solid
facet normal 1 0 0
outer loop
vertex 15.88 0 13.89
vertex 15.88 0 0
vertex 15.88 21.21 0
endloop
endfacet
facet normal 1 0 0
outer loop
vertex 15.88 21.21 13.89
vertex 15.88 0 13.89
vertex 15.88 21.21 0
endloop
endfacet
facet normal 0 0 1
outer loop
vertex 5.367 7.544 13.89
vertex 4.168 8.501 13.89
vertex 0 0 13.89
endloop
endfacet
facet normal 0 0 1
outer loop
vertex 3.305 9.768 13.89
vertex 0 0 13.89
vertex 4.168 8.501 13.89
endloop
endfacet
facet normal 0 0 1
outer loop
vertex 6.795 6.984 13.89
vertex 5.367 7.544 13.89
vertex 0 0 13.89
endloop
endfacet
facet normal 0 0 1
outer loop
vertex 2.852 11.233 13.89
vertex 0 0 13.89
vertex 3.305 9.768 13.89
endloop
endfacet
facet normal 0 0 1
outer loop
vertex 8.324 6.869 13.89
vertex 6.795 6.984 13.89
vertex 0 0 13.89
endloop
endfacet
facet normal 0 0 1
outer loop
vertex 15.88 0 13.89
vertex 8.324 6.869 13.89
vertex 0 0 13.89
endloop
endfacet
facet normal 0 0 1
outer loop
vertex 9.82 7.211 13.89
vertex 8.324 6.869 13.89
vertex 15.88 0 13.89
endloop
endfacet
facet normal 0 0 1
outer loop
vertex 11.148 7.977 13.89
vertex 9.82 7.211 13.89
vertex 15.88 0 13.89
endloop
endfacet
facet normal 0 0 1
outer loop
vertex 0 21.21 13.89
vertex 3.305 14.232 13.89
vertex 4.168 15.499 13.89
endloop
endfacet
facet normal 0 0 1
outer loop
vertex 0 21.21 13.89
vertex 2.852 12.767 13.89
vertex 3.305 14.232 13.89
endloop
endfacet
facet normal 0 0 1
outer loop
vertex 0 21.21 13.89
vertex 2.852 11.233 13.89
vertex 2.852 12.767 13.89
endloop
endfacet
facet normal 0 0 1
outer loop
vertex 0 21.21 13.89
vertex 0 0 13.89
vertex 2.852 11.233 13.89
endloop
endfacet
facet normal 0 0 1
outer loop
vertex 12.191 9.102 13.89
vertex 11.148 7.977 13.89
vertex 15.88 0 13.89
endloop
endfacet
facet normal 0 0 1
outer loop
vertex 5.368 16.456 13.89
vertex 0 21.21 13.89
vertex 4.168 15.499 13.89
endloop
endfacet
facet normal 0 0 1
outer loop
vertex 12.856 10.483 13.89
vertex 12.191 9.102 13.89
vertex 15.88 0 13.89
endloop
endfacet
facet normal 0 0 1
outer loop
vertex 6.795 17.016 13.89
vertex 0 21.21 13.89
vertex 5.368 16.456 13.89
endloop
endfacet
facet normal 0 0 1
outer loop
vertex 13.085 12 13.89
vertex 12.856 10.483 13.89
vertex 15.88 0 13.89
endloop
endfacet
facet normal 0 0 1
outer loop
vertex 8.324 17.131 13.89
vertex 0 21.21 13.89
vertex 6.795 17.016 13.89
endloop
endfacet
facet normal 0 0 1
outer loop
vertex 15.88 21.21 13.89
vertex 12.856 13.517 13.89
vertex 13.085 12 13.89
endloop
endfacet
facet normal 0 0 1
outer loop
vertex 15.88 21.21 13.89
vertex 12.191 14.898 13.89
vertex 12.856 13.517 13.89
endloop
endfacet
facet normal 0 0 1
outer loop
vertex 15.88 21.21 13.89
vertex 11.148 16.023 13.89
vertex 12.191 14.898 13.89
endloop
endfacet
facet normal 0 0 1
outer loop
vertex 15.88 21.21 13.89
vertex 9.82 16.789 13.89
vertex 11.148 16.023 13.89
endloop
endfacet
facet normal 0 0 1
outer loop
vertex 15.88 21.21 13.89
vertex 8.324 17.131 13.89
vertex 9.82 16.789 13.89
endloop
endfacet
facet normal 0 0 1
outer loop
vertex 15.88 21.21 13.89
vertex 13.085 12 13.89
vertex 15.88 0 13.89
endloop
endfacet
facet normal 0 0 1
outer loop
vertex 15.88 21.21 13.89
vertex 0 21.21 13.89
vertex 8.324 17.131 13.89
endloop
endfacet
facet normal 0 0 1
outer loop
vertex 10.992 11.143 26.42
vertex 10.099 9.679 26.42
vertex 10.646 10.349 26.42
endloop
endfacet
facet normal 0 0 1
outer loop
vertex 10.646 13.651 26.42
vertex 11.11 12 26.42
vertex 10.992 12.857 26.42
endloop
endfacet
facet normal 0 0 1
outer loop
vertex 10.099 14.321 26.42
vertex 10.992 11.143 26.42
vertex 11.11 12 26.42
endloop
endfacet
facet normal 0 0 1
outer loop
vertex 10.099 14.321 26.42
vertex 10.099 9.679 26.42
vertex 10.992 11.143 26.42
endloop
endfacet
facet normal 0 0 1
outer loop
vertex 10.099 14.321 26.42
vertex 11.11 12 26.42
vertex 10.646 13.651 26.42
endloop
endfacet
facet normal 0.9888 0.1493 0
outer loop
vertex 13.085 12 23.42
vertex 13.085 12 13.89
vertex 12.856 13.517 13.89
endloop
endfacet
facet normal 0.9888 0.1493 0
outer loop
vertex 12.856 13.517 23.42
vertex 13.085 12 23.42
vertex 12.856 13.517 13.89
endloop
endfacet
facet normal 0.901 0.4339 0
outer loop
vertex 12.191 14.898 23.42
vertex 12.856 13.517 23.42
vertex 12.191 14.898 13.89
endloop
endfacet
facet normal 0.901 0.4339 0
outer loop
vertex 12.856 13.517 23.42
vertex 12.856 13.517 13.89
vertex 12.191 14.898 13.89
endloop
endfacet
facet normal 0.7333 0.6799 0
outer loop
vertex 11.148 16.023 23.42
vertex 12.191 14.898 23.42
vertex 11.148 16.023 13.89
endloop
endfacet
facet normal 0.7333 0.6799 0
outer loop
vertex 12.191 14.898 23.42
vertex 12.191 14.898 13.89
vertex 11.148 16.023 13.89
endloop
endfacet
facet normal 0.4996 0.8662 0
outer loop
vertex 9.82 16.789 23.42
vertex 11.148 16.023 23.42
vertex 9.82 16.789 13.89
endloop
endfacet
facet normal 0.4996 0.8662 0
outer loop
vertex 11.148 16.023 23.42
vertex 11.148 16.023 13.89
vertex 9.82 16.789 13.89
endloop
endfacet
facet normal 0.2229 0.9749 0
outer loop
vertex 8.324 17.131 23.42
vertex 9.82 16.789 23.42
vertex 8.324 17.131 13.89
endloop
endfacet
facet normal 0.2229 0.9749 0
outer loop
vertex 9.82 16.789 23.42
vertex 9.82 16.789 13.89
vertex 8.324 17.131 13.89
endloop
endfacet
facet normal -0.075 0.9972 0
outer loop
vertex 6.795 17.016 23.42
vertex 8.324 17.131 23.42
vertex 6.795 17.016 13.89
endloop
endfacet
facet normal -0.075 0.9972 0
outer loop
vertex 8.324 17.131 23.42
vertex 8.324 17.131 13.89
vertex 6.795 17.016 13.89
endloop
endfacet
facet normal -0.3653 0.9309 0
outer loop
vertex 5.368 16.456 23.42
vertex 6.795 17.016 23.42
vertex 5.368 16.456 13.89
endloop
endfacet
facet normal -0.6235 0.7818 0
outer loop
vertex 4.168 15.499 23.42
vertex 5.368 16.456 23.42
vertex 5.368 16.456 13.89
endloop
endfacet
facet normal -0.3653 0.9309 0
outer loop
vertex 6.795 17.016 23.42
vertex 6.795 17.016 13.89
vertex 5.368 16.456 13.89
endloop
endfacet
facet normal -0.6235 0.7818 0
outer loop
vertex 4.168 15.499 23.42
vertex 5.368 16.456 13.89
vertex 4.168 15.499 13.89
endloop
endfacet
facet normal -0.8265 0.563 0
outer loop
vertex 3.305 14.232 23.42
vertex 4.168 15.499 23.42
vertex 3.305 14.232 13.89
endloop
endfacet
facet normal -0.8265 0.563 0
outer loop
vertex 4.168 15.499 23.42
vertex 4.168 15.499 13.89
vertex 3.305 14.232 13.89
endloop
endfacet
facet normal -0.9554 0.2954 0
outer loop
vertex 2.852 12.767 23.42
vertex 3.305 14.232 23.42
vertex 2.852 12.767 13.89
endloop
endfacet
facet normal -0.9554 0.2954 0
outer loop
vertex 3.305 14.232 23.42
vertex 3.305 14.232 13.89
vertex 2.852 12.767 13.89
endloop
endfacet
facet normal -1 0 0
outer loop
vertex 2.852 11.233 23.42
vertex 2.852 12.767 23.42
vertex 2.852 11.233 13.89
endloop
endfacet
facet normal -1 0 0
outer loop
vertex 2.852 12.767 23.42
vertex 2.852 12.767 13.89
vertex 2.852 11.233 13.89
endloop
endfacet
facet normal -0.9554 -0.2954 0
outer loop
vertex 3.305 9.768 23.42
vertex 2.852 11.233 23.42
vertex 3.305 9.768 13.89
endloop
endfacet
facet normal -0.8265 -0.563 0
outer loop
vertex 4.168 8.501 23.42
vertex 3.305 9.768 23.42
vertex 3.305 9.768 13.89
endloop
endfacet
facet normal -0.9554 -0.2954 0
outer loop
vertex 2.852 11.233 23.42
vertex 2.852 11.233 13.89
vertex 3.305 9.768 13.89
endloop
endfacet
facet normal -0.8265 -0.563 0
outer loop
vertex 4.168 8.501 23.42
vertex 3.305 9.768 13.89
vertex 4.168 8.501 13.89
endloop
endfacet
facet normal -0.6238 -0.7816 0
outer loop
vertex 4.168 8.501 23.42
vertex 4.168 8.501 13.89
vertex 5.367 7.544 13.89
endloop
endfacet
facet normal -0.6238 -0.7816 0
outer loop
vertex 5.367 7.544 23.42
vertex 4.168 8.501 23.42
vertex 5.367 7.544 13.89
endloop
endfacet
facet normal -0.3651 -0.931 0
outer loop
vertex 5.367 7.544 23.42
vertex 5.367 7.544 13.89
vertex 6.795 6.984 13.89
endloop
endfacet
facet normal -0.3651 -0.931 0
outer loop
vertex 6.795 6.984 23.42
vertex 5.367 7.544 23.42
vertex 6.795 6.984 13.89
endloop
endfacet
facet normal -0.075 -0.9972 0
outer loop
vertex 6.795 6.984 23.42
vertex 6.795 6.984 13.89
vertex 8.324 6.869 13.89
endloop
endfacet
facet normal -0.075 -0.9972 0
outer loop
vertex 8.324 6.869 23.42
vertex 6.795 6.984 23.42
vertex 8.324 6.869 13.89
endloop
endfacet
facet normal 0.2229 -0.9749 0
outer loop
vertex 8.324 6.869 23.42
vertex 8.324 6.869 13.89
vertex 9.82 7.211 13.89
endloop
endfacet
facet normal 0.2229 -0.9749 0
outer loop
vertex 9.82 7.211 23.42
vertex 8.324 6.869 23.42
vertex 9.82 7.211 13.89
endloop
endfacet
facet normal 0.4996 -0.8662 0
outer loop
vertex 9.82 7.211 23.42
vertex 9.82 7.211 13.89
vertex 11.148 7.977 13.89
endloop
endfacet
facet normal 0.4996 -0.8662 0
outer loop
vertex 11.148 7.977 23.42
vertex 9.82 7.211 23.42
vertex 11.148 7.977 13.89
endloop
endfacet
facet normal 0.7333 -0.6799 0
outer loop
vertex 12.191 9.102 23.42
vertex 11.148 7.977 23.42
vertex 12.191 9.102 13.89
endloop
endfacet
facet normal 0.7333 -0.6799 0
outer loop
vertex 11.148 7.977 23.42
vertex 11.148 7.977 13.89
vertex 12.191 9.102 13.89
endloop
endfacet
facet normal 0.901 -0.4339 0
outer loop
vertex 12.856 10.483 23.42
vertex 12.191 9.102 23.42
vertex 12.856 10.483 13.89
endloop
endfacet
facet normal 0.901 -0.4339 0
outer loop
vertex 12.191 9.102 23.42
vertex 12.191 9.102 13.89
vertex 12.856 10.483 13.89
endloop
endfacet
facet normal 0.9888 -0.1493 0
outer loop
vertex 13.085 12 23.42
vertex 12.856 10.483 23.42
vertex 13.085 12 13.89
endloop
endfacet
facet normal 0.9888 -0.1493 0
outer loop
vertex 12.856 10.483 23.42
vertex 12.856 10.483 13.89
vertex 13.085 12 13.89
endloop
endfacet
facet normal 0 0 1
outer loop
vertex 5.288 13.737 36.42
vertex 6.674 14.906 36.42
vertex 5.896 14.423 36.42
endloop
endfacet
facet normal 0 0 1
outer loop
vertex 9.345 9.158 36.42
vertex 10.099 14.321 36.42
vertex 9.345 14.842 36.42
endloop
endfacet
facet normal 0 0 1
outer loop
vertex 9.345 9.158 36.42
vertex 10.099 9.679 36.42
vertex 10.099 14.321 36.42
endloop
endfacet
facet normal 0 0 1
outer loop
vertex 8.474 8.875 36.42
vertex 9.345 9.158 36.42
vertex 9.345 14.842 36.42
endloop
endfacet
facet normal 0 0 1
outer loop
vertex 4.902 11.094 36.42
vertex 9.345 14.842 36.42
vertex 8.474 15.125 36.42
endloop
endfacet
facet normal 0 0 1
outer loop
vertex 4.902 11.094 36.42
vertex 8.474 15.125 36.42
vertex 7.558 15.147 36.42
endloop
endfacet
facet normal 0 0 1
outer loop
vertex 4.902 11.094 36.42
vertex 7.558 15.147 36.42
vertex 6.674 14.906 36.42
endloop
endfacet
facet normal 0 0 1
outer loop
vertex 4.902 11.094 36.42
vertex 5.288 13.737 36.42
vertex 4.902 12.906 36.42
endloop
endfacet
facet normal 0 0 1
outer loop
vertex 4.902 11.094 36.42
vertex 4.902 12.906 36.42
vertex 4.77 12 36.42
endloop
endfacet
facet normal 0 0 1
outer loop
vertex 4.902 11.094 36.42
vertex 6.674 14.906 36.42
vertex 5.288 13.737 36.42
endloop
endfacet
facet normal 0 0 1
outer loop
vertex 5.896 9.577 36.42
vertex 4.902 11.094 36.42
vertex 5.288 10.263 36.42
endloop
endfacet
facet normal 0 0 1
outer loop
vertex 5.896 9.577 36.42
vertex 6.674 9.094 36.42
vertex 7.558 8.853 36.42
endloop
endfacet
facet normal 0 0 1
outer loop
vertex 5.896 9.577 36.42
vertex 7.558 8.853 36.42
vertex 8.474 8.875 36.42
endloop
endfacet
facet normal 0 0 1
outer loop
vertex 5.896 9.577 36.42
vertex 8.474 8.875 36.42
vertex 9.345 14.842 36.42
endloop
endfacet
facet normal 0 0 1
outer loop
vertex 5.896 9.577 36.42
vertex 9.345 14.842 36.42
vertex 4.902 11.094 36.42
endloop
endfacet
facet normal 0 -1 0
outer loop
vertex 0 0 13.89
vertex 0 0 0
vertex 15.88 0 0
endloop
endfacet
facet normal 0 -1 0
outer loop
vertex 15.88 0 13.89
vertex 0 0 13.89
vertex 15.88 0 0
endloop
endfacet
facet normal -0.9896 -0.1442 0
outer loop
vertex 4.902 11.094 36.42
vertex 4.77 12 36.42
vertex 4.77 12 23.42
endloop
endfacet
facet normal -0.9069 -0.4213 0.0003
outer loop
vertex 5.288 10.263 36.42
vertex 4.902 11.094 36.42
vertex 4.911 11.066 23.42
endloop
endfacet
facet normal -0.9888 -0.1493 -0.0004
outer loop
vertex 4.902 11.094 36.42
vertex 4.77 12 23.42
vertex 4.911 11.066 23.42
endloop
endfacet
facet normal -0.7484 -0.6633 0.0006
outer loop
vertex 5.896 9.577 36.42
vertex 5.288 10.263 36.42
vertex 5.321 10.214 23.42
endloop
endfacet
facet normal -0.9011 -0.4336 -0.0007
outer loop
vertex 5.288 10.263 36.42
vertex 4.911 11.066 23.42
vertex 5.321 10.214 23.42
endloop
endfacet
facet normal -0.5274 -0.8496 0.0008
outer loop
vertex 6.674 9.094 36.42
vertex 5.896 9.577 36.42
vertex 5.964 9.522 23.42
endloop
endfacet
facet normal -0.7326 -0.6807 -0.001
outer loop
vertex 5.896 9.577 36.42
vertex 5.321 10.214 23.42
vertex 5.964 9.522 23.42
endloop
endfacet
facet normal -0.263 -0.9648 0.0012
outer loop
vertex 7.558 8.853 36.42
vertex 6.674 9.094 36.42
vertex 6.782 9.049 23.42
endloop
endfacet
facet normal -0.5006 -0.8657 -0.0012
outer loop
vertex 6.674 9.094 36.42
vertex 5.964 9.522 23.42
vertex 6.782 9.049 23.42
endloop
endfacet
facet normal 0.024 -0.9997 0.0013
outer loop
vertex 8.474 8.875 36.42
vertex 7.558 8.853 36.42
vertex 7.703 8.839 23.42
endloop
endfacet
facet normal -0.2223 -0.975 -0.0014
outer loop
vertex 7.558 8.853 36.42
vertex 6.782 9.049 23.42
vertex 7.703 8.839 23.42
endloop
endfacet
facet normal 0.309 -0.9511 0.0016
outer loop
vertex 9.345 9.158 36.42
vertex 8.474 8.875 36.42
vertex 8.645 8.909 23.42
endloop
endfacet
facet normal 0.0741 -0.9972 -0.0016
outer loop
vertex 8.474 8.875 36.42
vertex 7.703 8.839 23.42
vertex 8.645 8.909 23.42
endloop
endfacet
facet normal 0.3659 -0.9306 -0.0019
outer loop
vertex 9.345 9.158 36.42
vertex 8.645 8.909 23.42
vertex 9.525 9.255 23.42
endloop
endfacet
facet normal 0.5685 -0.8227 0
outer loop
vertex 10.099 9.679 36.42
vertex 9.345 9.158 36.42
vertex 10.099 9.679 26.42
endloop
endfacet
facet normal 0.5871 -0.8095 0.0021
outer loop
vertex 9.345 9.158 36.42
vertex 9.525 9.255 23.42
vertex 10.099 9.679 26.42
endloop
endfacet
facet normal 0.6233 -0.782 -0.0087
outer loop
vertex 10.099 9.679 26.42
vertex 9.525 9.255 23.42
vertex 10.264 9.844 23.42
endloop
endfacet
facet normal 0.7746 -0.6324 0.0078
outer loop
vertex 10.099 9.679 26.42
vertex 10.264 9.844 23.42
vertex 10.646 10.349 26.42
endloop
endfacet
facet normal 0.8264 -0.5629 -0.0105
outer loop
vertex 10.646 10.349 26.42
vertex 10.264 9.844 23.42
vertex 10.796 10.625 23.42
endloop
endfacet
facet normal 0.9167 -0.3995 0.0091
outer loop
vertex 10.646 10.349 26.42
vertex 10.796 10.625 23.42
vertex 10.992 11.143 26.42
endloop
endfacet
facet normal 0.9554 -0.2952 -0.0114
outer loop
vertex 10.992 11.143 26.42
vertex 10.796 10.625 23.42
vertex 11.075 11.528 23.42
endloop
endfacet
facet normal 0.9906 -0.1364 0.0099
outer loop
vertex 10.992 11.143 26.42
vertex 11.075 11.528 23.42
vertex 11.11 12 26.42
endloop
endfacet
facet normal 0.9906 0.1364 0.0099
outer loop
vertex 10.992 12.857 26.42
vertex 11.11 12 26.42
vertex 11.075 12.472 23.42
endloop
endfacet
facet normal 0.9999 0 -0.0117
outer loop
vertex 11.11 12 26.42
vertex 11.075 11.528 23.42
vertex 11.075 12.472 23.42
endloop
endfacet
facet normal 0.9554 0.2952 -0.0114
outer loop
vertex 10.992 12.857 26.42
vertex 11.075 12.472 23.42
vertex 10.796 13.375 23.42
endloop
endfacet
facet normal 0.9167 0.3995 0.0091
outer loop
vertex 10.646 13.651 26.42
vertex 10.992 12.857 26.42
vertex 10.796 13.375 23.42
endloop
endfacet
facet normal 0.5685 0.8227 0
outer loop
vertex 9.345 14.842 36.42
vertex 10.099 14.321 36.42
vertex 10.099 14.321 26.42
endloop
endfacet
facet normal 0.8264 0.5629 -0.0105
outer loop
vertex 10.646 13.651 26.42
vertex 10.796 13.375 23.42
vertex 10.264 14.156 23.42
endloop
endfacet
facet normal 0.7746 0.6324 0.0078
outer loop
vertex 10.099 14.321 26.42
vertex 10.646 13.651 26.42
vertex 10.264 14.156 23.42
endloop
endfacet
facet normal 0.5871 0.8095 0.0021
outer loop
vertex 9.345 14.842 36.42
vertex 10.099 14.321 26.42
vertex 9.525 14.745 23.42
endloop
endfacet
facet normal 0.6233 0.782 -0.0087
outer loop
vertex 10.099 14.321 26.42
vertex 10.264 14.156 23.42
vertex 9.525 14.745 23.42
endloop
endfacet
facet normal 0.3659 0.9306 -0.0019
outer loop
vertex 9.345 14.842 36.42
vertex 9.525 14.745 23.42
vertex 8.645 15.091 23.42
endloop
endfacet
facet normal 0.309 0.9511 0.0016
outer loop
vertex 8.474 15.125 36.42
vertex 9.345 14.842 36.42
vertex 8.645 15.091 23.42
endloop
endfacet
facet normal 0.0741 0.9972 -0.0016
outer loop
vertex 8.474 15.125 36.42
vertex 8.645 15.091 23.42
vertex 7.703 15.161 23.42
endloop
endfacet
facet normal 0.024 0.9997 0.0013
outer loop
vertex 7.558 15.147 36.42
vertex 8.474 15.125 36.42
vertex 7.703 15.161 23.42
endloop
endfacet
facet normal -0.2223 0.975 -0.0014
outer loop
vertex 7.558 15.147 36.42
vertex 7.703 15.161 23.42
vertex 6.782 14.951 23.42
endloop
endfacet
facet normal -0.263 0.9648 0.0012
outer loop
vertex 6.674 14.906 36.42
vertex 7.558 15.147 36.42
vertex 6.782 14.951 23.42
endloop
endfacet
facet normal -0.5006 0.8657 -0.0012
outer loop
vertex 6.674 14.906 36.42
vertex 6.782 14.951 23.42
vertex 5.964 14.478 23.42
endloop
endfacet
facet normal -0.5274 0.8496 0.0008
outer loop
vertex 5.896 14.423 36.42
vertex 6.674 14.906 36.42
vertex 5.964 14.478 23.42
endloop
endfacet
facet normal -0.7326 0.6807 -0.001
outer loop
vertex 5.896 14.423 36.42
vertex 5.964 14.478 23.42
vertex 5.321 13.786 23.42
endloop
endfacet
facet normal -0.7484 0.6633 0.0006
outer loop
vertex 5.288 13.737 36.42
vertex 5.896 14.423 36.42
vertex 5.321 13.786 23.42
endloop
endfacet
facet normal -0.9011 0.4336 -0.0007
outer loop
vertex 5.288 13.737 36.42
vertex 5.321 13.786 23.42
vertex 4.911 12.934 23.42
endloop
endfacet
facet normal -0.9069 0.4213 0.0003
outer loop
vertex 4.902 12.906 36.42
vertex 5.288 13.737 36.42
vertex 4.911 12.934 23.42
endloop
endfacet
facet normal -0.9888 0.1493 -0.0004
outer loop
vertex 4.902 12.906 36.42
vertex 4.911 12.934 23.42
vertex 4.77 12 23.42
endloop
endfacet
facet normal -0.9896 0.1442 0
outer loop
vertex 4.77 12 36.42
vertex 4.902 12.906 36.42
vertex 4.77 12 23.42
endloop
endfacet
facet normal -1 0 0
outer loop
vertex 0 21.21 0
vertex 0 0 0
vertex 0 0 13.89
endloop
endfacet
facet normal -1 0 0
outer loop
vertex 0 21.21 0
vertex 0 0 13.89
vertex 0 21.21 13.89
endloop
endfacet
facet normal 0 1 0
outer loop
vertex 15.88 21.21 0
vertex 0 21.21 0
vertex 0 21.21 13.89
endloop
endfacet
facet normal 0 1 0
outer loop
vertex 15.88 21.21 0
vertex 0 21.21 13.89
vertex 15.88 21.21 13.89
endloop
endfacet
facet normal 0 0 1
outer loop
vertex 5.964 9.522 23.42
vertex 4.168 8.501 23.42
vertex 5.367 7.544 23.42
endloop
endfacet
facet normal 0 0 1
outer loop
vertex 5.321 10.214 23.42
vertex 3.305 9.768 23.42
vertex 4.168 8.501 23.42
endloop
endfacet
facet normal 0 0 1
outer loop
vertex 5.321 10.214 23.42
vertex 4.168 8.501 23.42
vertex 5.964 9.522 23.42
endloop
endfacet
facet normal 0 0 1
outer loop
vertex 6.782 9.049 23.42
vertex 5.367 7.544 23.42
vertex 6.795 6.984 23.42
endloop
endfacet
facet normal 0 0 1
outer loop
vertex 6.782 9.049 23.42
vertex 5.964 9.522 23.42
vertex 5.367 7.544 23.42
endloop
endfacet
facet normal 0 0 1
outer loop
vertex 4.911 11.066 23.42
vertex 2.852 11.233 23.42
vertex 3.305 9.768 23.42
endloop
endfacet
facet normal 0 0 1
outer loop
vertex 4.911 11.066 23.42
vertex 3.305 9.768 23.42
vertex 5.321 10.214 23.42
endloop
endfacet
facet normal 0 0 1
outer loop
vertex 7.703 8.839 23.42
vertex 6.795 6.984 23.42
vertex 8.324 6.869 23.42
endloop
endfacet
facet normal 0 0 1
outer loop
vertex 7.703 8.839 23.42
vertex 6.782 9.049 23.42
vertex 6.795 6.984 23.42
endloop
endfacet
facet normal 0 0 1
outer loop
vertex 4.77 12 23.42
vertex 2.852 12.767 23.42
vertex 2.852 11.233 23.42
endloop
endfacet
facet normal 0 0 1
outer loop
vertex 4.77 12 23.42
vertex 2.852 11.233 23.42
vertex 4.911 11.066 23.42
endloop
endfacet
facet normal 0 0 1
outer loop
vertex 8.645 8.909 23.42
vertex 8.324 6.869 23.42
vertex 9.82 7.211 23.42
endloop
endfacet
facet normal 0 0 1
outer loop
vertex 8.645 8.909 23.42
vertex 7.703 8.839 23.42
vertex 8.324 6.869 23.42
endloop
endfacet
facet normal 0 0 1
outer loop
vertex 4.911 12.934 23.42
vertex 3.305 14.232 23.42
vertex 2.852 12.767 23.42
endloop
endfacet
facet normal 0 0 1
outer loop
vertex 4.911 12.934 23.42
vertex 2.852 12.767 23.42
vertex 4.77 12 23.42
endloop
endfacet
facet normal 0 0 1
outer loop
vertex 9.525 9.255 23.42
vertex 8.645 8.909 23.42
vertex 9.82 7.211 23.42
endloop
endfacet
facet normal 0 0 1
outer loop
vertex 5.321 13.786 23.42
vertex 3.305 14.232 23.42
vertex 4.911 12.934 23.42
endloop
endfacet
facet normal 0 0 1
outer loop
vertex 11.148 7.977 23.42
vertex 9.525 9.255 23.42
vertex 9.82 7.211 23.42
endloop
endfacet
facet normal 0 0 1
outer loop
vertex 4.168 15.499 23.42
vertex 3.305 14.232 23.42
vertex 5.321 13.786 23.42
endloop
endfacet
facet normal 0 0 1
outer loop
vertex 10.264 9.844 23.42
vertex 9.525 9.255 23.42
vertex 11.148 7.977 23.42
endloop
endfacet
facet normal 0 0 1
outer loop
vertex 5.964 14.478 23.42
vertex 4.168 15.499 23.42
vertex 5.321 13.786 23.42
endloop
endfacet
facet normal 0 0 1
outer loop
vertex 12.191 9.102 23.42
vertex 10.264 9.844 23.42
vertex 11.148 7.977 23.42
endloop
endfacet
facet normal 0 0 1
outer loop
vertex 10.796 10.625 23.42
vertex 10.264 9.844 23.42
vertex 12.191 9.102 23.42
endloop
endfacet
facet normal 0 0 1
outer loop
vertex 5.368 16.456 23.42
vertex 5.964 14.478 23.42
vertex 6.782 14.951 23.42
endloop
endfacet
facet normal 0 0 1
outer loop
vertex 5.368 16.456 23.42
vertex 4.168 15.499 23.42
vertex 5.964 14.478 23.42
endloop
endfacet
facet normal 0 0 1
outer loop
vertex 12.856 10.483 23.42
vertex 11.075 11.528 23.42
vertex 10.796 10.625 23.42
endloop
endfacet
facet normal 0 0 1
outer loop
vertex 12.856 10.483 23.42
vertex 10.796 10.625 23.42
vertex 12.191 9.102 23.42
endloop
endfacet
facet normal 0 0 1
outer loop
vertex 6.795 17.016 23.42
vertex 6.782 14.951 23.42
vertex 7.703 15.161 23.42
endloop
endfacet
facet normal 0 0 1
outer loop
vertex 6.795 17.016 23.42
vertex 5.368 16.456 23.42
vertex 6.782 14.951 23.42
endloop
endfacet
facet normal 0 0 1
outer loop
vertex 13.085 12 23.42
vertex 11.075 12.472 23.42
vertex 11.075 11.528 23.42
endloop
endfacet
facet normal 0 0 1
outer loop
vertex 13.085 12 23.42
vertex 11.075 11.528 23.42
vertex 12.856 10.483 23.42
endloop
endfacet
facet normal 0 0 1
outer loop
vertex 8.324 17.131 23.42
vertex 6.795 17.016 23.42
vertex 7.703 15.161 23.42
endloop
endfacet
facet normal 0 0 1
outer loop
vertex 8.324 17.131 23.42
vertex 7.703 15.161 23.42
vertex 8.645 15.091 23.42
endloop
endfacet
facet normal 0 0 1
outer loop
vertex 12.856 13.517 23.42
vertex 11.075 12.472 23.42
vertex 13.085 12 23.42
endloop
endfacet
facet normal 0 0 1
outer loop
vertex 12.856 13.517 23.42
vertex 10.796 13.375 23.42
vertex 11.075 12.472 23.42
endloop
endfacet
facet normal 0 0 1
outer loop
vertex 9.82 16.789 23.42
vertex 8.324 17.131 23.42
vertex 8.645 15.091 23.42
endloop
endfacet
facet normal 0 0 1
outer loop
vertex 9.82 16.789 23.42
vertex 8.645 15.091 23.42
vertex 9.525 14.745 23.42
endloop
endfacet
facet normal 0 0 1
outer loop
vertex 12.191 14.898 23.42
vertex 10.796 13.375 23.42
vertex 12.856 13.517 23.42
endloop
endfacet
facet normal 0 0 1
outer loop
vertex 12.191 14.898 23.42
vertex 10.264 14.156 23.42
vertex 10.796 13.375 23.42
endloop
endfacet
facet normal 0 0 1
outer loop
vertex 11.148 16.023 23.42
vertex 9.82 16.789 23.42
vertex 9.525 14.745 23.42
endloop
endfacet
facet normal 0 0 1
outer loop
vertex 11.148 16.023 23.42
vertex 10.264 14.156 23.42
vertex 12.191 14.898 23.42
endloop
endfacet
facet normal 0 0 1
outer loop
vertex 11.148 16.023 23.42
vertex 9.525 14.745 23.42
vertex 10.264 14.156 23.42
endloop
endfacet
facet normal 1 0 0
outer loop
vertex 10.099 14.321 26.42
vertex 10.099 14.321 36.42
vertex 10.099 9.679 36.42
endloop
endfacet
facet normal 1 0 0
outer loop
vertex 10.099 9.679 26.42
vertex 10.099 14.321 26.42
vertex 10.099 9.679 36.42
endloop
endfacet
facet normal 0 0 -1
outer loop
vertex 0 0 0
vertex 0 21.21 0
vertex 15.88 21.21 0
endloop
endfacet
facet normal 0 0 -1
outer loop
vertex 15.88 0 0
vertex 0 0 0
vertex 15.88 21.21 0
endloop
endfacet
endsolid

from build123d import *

# Parameters (mm, degrees)
SKETCH2_W           = 15.88
SKETCH2_H           = 21.21
BOSS_EXTRUDE1_DEPTH = 13.89
SKETCH3_R           = 5.145
BOSS_EXTRUDE2_DEPTH = 9.53
SKETCH4_R           = 3.17
BOSS_EXTRUDE3_DEPTH = 13
CUT_EXTRUDE1_DEPTH  = 10


with BuildPart() as part:
    # Sketch2 → Boss-Extrude1 (new body)
    with BuildSketch(Plane.XY):
        with Locations((7.94, 10.605)):
            Rectangle(SKETCH2_W, SKETCH2_H)
    extrude(amount=BOSS_EXTRUDE1_DEPTH)

    # Sketch3 → Boss-Extrude2 (add)
    with BuildSketch(Plane.XY.offset(13.89)):
        with Locations((7.94, 12)):
            Circle(SKETCH3_R)
    extrude(amount=BOSS_EXTRUDE2_DEPTH)

    # Sketch4 → Boss-Extrude3 (add)
    with BuildSketch(Plane.XY.offset(23.42)):
        with Locations(Location((7.94, 12, 0), (0, 0, 180))):
            Circle(SKETCH4_R)
    extrude(amount=BOSS_EXTRUDE3_DEPTH)

    # Sketch5 → Cut-Extrude1 (cut)
    with BuildSketch(Plane.XY.offset(36.42)):
        with BuildLine():
            Line((10.099, 14.327948453), (10.099, 9.672051547))
            ThreePointArc((10.099, 9.672051547), (11.115, 12), (10.099, 14.327948453))
        make_face()
    extrude(amount=-CUT_EXTRUDE1_DEPTH, mode=Mode.SUBTRACT)


solid = part.part
